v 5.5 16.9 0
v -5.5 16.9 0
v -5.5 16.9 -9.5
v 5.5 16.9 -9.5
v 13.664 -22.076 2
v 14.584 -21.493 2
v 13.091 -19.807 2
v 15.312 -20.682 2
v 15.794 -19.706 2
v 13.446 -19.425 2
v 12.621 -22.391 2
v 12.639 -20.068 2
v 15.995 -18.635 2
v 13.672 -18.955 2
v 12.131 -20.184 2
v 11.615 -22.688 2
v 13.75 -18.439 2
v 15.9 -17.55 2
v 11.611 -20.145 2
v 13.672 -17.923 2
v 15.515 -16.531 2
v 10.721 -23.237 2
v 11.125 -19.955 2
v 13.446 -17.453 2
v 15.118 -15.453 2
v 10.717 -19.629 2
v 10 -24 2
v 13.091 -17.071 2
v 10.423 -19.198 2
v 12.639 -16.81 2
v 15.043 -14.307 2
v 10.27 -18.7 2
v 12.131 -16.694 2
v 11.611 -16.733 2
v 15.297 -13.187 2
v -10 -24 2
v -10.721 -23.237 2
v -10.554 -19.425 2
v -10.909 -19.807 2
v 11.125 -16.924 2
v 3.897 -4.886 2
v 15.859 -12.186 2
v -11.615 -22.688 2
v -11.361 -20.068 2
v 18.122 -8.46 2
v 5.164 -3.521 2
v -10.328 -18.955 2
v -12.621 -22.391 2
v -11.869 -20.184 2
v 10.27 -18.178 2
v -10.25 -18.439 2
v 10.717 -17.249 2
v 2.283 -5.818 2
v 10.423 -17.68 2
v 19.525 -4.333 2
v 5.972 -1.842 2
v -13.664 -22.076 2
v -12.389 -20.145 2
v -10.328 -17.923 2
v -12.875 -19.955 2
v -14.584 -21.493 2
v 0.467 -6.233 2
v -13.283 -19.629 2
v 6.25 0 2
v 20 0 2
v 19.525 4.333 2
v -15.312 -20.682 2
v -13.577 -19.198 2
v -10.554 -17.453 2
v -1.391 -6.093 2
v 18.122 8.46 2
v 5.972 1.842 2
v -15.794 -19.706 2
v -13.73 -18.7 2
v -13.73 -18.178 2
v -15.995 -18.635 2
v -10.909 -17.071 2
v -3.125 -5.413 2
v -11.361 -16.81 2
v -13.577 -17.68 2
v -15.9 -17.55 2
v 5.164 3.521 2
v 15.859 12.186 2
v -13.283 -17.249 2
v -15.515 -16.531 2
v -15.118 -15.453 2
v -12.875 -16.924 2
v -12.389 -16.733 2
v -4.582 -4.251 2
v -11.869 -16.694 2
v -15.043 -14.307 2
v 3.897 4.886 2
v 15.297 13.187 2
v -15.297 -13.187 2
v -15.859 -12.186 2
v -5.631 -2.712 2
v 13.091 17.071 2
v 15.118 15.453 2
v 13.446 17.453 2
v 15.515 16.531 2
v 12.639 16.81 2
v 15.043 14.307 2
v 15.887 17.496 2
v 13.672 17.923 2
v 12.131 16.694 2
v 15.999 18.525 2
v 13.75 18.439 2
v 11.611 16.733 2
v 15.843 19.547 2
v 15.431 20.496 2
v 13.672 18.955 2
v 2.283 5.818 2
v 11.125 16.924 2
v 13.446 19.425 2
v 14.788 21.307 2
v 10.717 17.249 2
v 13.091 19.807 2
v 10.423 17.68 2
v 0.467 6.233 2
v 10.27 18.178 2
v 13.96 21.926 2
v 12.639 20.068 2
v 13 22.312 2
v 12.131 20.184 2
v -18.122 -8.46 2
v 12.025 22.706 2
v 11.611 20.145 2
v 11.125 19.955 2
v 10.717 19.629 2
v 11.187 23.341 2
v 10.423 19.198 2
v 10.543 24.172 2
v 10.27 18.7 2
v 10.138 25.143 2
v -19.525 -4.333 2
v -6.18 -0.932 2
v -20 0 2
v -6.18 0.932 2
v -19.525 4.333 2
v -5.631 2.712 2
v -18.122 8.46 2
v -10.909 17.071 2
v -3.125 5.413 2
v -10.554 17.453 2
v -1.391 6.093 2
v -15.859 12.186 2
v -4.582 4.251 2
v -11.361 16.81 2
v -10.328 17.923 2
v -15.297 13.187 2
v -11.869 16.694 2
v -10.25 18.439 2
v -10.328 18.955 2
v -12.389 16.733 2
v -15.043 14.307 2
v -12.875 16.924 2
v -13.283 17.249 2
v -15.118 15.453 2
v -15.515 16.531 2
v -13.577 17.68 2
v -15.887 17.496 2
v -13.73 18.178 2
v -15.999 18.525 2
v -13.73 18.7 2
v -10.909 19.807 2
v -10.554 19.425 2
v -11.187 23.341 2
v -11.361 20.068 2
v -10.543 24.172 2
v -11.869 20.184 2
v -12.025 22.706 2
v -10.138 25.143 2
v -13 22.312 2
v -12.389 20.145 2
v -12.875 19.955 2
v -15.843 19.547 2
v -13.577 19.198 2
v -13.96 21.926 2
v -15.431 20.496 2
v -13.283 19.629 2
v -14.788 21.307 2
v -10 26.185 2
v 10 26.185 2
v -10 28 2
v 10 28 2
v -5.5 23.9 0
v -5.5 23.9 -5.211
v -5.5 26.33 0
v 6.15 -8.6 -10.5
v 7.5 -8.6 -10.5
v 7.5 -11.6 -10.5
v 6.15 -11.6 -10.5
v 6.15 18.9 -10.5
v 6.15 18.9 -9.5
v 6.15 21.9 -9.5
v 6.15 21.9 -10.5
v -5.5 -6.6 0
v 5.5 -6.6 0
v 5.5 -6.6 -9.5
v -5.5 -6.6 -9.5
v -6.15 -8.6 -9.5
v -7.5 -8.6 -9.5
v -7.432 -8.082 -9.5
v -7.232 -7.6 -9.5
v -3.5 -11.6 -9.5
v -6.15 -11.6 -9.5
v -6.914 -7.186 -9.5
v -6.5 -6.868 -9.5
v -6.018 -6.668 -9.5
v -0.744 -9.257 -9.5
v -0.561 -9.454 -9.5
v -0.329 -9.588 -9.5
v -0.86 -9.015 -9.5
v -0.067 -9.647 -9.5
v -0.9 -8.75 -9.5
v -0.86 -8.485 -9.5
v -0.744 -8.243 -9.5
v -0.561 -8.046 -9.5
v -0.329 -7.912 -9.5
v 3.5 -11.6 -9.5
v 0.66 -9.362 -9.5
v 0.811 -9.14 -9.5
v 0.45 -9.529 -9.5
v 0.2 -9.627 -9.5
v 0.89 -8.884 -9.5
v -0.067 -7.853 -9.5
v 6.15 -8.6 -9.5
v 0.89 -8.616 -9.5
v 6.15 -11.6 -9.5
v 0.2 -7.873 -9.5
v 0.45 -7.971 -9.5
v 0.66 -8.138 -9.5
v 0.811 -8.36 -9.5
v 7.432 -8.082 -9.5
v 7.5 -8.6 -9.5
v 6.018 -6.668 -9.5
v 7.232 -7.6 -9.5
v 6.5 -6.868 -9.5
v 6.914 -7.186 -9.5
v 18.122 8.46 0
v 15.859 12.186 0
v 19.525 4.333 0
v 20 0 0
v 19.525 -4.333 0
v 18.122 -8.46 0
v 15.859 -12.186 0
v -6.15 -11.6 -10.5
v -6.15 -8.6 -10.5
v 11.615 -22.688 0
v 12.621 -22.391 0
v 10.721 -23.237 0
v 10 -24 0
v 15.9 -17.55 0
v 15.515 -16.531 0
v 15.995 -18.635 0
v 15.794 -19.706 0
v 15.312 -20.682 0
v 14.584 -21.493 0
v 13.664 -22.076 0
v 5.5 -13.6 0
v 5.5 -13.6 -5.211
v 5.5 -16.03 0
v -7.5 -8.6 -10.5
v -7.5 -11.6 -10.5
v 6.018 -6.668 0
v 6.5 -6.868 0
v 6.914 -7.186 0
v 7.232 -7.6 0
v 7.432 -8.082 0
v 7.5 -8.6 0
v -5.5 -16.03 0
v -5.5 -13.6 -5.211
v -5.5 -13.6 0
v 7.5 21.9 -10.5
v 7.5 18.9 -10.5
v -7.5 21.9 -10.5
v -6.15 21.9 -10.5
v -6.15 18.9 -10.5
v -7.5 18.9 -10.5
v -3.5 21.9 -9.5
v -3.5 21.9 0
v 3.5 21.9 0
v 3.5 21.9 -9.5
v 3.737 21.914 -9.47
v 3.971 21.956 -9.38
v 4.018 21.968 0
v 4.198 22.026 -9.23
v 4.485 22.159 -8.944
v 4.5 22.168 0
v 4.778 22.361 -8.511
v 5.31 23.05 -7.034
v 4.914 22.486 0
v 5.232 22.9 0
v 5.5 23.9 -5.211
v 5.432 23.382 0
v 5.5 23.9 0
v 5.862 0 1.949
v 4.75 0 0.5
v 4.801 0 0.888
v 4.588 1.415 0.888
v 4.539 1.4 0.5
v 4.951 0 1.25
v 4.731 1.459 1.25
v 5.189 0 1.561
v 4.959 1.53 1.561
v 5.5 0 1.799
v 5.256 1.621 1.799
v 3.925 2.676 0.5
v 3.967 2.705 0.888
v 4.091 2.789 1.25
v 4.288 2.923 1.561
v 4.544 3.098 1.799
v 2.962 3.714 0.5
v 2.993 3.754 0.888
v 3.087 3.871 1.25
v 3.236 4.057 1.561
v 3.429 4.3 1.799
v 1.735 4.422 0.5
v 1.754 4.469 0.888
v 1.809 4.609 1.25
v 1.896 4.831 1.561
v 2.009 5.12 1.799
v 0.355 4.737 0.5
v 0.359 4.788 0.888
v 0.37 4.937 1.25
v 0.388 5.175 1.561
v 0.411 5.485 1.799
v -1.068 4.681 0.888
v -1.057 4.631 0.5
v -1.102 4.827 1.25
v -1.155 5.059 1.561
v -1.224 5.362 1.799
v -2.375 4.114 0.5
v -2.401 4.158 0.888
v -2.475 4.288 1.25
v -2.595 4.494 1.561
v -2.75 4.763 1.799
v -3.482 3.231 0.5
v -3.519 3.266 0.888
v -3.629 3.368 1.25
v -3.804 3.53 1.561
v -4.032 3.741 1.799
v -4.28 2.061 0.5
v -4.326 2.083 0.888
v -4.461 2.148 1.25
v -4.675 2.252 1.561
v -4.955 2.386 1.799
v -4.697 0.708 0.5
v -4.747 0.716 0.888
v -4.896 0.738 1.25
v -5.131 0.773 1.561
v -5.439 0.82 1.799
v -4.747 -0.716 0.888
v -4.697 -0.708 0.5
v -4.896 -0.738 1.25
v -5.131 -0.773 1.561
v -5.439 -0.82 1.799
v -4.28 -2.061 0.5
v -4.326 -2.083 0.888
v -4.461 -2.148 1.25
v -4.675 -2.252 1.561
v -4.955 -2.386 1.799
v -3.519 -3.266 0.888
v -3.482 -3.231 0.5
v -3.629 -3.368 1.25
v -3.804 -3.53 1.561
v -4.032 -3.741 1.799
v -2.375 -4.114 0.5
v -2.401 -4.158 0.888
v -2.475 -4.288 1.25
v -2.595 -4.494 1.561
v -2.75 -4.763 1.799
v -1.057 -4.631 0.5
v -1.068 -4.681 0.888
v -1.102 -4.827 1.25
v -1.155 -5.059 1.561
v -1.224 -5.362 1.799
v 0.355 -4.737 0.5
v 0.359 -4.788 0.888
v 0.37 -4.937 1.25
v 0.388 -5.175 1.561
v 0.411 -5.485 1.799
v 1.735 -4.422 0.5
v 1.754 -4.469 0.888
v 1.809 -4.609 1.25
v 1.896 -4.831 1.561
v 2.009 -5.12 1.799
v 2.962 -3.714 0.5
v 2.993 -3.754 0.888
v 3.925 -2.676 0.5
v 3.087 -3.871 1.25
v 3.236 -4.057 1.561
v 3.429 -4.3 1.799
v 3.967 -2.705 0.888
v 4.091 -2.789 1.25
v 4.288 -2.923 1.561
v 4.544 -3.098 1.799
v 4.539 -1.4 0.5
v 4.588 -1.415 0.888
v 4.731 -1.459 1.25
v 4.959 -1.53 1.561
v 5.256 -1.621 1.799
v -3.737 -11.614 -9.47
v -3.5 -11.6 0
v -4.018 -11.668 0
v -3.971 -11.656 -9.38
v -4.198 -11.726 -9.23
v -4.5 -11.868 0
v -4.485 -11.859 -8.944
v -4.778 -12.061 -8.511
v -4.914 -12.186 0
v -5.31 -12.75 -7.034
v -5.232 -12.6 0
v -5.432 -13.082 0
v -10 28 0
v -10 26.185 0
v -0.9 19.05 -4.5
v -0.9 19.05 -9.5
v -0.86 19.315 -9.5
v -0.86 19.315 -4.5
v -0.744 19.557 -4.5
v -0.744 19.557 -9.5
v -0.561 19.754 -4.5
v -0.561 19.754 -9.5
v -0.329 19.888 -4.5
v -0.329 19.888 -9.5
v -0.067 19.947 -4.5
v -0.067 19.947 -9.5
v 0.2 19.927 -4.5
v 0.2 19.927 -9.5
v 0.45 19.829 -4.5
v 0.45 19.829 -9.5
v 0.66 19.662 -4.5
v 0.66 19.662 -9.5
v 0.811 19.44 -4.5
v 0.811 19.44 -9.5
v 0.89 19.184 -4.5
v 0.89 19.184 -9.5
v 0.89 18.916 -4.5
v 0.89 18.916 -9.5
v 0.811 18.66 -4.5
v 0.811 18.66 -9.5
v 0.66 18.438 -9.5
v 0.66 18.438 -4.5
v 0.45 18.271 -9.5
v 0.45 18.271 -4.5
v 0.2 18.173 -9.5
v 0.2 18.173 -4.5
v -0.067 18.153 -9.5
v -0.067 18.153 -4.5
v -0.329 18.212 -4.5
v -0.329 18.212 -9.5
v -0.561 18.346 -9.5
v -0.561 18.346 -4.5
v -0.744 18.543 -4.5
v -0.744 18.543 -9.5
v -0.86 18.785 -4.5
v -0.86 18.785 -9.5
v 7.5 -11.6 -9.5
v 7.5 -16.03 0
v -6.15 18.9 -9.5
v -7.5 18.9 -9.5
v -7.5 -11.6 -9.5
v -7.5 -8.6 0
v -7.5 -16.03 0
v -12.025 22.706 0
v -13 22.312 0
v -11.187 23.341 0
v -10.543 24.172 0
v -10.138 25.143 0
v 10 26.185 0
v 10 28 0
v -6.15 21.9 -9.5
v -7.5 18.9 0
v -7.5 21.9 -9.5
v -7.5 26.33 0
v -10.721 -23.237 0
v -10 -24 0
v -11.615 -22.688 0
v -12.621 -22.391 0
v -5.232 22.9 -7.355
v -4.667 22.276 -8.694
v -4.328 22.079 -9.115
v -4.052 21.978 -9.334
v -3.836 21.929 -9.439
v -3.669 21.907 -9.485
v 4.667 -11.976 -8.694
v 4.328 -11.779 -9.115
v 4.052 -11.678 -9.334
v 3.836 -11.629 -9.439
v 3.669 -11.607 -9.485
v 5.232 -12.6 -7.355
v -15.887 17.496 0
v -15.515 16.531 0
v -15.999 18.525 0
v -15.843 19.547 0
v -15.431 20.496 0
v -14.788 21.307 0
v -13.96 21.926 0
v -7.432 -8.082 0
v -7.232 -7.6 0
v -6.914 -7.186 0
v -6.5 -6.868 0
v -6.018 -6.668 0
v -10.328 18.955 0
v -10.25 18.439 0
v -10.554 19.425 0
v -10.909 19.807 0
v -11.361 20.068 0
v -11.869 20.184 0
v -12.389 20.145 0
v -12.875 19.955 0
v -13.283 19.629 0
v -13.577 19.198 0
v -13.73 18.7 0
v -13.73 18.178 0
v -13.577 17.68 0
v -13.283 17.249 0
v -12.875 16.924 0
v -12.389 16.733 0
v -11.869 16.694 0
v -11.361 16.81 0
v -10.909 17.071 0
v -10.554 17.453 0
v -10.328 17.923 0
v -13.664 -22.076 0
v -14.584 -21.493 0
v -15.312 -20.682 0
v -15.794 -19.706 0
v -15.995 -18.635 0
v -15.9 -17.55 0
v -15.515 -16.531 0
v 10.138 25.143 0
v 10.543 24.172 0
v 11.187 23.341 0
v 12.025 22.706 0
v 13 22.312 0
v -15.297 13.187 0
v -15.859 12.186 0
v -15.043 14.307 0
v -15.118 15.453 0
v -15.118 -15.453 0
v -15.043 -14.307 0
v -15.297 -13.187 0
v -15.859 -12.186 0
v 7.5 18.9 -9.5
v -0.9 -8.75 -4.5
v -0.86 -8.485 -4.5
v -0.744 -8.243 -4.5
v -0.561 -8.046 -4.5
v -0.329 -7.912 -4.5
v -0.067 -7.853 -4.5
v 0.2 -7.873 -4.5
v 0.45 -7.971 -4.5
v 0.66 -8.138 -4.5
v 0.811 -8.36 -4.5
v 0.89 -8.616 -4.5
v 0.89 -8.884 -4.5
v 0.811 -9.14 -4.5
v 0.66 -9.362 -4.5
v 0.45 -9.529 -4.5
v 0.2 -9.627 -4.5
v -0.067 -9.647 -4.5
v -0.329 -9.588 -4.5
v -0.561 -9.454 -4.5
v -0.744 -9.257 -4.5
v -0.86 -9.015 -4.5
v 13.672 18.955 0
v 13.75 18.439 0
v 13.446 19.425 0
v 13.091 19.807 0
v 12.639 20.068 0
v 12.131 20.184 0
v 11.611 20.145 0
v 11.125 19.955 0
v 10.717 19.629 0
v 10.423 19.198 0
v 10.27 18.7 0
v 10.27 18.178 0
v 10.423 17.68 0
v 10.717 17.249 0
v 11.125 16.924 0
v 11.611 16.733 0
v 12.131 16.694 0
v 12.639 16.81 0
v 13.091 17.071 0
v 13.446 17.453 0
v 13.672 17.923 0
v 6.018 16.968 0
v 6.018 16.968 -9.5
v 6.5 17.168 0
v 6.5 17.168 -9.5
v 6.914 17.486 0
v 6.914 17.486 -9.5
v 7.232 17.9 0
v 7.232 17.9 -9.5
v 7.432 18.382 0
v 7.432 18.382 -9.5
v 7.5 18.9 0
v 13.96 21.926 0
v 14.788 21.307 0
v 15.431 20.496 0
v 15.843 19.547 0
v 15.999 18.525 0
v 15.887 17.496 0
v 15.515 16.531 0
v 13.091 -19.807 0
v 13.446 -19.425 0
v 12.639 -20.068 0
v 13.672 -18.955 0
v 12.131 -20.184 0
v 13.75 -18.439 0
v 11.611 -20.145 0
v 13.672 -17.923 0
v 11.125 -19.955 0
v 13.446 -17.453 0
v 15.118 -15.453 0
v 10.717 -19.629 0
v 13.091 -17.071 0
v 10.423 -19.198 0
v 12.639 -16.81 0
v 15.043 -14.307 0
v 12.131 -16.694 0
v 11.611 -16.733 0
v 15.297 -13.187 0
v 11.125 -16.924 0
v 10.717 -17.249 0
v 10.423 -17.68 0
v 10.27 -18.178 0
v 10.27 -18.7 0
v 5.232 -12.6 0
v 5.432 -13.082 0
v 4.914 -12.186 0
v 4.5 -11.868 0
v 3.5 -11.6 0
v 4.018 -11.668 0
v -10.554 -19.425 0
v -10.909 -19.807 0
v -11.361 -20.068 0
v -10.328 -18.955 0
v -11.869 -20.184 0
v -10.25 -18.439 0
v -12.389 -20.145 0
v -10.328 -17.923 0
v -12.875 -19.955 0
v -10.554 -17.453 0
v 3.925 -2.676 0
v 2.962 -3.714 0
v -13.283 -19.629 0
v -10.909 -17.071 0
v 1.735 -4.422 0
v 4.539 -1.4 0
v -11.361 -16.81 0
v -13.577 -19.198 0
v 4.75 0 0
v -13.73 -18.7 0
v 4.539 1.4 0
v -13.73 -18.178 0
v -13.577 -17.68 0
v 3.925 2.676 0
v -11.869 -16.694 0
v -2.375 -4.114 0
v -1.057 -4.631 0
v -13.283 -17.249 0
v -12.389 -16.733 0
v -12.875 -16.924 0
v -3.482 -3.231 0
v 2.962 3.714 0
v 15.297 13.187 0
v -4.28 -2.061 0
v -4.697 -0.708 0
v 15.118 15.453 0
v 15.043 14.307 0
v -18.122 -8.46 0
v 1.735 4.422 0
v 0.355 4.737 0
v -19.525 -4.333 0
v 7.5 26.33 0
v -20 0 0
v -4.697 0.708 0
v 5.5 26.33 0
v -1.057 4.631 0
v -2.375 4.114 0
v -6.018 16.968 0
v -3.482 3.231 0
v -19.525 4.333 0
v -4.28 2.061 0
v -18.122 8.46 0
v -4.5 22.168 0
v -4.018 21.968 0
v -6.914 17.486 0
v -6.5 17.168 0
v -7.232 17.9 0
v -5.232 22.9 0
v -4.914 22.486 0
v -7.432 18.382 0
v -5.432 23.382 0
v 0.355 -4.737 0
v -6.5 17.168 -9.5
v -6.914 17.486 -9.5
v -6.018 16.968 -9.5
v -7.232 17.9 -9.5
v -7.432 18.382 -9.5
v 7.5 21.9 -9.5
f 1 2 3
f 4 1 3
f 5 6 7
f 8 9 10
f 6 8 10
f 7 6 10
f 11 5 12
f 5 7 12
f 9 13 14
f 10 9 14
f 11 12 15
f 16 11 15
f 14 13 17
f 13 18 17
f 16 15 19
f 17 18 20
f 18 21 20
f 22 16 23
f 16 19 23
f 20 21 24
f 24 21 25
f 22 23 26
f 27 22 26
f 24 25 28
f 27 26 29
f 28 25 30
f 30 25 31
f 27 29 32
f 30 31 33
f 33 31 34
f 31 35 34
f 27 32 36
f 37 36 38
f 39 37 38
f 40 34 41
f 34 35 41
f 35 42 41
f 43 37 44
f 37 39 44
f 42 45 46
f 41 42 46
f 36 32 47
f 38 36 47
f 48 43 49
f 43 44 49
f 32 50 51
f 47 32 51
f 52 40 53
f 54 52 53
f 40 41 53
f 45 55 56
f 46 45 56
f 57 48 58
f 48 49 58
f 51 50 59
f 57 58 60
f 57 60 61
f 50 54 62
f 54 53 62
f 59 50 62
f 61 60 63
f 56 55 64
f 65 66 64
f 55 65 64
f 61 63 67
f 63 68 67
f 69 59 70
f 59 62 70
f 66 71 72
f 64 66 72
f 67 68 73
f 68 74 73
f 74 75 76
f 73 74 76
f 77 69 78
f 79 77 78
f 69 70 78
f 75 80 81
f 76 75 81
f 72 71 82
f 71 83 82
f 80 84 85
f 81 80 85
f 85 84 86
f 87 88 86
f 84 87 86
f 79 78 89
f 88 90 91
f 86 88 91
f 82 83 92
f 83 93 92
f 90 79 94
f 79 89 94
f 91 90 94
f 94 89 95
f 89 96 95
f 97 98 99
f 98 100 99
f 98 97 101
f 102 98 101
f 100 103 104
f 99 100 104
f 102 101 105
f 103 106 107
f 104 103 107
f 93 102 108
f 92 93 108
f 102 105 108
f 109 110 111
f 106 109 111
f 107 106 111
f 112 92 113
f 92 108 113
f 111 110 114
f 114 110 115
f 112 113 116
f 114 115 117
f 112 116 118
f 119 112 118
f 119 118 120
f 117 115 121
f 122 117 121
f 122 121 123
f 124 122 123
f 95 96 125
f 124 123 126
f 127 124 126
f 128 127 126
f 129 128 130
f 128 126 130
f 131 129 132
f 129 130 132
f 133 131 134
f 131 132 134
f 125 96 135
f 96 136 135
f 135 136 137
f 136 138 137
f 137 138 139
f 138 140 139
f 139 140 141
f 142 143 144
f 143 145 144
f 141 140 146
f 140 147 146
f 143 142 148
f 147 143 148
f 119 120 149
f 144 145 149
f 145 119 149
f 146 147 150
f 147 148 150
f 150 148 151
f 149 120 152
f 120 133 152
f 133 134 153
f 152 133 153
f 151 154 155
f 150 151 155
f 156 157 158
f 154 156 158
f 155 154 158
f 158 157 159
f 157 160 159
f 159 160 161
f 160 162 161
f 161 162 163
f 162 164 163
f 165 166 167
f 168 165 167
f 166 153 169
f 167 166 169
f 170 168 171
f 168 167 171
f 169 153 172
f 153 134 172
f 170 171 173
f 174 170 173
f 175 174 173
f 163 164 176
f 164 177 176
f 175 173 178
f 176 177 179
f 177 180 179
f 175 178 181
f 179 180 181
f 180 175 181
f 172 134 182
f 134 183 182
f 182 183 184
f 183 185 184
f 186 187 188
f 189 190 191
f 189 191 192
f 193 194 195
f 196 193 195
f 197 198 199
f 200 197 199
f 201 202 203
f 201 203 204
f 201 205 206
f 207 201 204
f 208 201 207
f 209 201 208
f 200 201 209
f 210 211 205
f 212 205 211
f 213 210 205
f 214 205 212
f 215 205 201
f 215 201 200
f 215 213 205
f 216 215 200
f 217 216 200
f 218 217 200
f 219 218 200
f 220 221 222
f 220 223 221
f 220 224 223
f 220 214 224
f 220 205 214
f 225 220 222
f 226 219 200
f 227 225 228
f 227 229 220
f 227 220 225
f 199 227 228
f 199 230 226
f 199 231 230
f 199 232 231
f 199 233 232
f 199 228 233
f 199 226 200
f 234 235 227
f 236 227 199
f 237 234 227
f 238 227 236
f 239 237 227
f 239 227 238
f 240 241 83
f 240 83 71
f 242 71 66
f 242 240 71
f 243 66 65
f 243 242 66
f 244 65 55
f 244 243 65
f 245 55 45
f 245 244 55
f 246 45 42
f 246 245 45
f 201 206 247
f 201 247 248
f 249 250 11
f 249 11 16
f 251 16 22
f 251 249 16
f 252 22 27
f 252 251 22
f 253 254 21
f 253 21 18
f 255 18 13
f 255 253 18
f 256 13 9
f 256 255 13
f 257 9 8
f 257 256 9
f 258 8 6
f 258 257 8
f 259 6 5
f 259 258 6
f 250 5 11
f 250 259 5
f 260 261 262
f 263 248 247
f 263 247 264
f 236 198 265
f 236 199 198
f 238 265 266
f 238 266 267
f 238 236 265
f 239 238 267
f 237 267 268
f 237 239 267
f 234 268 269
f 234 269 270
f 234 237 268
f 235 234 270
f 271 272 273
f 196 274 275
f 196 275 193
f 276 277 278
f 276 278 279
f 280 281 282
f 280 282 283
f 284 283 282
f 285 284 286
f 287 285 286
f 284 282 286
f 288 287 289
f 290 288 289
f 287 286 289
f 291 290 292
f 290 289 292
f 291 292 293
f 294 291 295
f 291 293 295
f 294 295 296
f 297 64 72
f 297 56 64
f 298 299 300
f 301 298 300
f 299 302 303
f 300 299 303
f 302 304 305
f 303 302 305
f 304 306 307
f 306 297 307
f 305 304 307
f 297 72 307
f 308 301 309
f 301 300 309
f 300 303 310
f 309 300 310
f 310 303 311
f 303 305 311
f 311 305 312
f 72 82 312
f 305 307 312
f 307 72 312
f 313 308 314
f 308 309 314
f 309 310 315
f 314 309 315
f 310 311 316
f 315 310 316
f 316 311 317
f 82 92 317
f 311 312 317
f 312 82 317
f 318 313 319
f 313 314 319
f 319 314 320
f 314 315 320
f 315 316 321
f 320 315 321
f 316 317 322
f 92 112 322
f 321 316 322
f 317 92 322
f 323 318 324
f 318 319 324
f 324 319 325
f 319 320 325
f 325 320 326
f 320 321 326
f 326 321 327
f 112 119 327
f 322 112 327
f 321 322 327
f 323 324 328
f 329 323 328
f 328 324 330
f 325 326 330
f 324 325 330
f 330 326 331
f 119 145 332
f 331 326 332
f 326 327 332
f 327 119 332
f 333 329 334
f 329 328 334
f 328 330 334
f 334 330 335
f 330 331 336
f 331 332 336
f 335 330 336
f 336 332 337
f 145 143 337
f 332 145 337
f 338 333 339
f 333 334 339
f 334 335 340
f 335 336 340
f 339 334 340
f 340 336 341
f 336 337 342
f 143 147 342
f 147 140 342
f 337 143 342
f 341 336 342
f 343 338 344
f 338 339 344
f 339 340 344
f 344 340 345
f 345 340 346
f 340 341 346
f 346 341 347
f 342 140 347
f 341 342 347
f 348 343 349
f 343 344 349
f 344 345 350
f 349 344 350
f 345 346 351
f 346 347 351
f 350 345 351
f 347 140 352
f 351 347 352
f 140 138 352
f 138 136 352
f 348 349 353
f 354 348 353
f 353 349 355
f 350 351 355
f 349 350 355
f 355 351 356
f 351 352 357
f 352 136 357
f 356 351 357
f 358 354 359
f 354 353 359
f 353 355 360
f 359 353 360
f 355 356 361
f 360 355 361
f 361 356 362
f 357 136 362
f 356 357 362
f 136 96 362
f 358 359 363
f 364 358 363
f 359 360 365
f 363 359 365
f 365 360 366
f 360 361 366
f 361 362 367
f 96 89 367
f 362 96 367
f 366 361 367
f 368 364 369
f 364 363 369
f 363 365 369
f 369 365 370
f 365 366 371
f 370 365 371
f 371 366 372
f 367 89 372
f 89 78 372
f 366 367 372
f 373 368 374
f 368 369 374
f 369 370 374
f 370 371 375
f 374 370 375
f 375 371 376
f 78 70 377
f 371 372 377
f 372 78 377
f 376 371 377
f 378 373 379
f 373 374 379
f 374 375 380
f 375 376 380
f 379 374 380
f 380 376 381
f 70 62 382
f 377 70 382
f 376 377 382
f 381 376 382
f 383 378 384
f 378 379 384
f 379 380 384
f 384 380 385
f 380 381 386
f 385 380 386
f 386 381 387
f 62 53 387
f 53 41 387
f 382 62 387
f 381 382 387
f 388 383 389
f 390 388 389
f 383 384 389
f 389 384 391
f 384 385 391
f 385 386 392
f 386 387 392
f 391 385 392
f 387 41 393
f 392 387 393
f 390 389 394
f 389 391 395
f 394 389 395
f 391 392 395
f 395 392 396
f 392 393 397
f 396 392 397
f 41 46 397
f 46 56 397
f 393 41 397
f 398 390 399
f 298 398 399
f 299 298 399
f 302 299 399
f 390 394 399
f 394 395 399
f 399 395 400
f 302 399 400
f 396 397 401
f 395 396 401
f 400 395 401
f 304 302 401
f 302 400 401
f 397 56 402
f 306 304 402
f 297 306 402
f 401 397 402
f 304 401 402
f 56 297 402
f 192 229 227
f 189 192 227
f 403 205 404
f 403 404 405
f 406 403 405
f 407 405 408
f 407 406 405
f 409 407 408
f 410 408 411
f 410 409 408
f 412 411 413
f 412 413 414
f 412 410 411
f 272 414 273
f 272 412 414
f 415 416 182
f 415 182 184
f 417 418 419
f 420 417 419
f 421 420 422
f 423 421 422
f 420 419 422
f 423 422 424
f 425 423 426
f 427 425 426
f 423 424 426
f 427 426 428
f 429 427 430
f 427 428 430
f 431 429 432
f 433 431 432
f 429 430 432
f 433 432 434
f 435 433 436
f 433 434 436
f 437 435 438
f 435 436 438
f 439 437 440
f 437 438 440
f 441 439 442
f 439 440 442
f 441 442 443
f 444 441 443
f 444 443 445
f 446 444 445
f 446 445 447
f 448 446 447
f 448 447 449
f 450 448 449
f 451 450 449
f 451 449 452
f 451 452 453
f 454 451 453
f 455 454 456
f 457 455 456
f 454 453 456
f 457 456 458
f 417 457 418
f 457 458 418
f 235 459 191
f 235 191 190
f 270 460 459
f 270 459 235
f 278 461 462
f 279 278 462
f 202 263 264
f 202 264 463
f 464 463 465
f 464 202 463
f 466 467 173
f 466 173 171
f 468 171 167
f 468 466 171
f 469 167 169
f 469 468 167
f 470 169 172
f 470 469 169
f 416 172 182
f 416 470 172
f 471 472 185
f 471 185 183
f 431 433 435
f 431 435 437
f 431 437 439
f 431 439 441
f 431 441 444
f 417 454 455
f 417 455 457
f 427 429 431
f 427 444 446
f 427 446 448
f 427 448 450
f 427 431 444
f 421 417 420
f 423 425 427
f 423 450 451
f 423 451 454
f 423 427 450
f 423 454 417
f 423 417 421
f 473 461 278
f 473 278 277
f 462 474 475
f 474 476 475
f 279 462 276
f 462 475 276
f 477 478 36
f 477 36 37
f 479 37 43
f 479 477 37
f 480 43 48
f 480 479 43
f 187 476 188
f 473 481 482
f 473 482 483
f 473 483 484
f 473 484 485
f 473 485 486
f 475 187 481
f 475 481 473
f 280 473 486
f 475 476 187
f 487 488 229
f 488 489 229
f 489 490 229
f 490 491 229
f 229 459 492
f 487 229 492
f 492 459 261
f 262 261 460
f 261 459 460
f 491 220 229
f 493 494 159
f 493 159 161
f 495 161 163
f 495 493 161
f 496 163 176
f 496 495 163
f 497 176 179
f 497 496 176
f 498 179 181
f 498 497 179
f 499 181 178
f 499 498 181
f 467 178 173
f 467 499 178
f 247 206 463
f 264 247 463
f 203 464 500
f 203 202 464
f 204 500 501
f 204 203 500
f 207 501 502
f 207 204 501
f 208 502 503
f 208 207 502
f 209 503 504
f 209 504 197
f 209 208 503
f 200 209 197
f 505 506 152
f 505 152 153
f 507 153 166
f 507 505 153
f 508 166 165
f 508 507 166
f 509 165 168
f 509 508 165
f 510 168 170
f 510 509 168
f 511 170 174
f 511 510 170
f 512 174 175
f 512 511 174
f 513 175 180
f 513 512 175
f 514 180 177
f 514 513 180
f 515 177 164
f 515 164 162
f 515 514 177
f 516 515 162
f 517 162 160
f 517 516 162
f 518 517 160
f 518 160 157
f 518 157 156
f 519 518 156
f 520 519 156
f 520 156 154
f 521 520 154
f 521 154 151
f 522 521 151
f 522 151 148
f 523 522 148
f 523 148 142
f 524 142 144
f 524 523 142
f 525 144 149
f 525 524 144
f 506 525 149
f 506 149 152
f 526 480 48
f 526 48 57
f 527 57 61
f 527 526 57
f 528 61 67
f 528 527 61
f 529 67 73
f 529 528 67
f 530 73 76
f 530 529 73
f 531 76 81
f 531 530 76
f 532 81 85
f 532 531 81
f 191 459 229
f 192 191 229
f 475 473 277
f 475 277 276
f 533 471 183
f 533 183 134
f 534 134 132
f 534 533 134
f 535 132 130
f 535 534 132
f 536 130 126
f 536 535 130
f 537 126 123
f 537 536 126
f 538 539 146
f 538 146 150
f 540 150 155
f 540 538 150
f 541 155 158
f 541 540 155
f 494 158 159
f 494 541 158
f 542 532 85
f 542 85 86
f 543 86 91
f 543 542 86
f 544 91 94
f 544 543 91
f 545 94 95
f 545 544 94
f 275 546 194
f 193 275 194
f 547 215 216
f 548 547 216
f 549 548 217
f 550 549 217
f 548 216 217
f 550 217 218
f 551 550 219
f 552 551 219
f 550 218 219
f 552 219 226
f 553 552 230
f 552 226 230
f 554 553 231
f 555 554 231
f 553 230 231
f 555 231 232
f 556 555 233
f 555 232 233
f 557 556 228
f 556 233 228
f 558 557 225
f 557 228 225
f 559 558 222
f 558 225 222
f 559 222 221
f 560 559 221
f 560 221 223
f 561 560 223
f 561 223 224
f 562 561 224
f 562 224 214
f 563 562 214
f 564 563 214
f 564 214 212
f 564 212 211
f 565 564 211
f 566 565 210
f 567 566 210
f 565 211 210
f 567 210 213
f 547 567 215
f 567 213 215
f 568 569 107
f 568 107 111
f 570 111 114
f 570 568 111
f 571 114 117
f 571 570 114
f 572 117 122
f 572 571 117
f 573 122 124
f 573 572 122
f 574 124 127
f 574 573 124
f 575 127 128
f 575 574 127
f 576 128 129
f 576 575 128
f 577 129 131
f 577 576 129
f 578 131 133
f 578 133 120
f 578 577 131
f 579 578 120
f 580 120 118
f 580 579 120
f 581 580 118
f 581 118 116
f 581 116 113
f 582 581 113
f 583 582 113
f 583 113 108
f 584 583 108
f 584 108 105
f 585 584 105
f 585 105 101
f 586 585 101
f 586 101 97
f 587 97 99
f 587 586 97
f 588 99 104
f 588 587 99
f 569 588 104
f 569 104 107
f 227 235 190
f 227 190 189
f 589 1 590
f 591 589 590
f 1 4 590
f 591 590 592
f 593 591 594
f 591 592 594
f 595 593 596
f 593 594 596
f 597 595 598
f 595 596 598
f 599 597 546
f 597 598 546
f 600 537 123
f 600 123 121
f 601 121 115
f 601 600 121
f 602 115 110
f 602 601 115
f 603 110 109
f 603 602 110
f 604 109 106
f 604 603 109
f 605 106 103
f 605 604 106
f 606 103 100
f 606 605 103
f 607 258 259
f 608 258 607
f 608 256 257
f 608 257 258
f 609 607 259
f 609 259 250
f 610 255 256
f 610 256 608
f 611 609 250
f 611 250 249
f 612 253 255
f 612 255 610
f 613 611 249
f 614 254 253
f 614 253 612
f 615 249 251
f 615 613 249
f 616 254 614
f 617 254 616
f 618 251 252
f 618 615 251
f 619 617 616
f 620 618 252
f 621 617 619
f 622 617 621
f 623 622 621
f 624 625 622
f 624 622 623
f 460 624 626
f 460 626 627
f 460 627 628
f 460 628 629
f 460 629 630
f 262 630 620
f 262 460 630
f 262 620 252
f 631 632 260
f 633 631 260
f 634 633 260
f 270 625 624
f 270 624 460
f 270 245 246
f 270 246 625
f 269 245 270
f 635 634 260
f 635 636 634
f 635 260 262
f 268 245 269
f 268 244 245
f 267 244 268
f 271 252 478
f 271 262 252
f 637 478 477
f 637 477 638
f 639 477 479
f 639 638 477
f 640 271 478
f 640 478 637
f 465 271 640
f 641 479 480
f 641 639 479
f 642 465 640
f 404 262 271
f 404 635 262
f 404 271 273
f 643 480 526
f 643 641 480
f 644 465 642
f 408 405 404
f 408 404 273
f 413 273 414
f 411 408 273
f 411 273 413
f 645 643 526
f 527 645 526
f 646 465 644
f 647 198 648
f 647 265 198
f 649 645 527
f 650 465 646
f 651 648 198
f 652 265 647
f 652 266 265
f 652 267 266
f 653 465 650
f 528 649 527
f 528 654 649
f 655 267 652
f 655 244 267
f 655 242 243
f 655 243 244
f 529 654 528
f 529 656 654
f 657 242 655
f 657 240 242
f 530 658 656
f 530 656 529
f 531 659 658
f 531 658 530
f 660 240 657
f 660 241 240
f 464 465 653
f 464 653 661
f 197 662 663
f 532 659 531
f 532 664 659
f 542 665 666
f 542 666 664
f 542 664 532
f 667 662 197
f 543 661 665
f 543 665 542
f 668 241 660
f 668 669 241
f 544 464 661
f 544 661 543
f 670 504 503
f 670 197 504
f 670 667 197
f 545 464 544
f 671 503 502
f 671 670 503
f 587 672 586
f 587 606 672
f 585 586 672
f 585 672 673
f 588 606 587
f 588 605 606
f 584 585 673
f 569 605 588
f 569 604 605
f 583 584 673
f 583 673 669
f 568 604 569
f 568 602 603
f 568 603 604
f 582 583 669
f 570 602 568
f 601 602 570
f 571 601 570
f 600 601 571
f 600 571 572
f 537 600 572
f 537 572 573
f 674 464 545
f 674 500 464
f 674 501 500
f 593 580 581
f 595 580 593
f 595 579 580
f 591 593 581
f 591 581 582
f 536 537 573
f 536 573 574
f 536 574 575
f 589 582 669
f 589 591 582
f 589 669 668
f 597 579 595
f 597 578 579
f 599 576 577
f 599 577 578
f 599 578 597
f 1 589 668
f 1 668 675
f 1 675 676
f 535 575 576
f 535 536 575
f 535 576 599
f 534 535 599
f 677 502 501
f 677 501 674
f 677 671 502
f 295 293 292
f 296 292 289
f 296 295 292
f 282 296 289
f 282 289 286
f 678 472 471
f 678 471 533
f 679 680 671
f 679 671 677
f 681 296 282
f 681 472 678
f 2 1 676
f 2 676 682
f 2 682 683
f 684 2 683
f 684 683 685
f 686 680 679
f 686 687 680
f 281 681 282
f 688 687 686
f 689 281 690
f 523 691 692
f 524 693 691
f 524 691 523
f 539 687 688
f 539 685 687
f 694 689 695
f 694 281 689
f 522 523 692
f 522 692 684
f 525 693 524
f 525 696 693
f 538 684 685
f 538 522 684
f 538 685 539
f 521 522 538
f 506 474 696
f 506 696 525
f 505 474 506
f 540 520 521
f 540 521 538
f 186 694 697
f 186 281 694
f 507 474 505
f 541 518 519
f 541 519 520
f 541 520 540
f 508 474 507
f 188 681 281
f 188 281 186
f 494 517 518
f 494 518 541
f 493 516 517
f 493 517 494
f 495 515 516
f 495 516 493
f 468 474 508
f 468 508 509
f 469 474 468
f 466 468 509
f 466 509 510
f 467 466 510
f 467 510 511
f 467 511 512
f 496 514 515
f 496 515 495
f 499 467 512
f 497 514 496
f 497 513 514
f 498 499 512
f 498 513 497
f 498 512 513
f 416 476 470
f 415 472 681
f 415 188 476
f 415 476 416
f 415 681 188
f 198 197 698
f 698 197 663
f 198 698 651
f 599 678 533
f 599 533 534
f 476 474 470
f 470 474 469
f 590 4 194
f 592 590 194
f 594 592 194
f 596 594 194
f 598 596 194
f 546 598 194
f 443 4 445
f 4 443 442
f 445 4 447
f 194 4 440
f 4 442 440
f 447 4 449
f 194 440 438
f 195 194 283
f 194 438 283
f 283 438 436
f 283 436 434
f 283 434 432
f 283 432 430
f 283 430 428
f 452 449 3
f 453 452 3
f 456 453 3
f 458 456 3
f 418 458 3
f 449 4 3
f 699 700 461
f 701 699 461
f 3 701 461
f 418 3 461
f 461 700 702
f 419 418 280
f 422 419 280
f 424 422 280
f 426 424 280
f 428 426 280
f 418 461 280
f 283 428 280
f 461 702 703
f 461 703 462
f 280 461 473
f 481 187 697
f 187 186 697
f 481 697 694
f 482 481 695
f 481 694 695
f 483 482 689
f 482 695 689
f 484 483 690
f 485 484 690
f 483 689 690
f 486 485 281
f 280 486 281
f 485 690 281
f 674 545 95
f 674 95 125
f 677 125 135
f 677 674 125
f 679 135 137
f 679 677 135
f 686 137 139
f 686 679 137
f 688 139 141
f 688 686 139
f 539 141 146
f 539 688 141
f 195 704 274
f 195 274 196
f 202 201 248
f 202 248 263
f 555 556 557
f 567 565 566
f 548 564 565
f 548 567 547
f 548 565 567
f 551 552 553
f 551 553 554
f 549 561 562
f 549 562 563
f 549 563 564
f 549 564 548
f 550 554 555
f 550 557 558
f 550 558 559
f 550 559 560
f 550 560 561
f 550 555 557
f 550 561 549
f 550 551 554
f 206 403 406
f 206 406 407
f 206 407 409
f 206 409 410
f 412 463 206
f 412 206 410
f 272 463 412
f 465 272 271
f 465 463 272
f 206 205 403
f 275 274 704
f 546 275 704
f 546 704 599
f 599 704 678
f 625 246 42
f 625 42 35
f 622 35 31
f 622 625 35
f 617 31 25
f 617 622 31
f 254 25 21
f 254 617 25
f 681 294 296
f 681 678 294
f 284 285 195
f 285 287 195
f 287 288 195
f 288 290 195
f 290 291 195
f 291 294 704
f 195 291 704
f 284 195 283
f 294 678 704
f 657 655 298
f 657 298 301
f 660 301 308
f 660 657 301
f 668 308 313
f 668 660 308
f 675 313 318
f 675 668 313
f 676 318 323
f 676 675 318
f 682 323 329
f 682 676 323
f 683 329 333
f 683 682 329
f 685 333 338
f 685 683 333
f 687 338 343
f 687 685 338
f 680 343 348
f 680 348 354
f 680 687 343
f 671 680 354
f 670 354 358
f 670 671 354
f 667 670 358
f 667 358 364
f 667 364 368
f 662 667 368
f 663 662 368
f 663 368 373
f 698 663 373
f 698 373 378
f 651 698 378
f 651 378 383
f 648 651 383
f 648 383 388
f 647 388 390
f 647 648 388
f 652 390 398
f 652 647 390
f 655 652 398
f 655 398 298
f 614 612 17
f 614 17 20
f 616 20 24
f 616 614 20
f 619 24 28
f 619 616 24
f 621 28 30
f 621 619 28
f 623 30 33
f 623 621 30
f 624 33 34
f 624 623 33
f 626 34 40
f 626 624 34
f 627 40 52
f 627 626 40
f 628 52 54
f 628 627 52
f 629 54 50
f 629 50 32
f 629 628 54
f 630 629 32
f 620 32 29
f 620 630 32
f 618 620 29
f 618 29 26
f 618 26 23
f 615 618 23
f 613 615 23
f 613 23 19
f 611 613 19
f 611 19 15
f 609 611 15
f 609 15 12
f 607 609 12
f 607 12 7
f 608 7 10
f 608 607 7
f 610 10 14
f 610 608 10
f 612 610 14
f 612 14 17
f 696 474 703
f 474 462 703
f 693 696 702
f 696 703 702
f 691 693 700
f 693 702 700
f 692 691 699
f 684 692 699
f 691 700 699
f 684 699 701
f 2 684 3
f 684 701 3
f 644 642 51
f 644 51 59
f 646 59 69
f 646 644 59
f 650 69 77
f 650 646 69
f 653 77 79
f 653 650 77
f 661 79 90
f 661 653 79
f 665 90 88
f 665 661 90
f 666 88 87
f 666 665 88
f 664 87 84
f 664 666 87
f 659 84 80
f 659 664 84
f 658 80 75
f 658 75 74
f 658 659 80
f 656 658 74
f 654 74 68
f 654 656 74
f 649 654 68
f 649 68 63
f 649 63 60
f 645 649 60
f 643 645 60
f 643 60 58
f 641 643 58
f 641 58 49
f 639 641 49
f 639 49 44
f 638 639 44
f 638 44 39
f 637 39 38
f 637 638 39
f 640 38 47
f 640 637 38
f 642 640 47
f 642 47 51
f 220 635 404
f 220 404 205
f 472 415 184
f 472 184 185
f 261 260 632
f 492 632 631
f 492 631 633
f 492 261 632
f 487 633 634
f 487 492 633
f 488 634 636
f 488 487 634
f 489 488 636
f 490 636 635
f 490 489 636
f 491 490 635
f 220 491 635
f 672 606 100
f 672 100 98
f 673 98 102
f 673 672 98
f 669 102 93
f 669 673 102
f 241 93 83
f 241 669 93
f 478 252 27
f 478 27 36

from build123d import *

# Parameters (mm, degrees)
CROQUIS1_R              = 1.75
CROQUIS1_R_2            = 4.75
SALIENTE_EXTRUIR1_DEPTH = 2
REDONDEO1_R             = 1.5
CROQUIS2_W              = 9.5
CROQUIS2_H              = 5
SALIENTE_EXTRUIR2_DEPTH = 7.5
CROQUIS3_R              = 0.9
CORTAR_EXTRUIR1_DEPTH   = 5
SALIENTE_EXTRUIR3_DEPTH = 2
REDONDEO2_R             = 2
REDONDEO3_R             = 2
CROQUIS5_W              = 1.35
CROQUIS5_H              = 3
SALIENTE_EXTRUIR4_DEPTH = 1


with BuildPart() as part:
    # Croquis1 → Saliente-Extruir1 (new body)
    with BuildSketch(Plane.XY):
        with BuildLine():
            Line((10, -24), (8, -24))
            Line((8, -24), (-8, -24))
            Line((-8, -24), (-10, -24))
            ThreePointArc((-10, -24), (-11.149780948, -22.933215846), (-12.621352058, -22.390534425))
            ThreePointArc((-12.621352058, -22.390534425), (-15.586404832, -20.210444436), (-15.515491876, -16.530865429))
            ThreePointArc((-15.515491876, -16.530865429), (-15.043435032, -14.307276752), (-15.859153127, -12.185534953))
            ThreePointArc((-15.859153127, -12.185534953), (-20, 0), (-15.859153127, 12.185534953))
            ThreePointArc((-15.859153127, 12.185534953), (-15.043435032, 14.307276752), (-15.515491876, 16.530865429))
            ThreePointArc((-15.515491876, 16.530865429), (-15.667833806, 20.035019732), (-13, 22.312072261))
            ThreePointArc((-13, 22.312072261), (-10.83772234, 23.735565864), (-10, 26.185055607))
            Line((-10, 26.185055607), (-10, 28))
            Line((-10, 28), (10, 28))
            Line((10, 28), (10, 26.185055607))
            ThreePointArc((10, 26.185055607), (10.83772234, 23.735565864), (13, 22.312072261))
            ThreePointArc((13, 22.312072261), (15.667833806, 20.035019732), (15.515491876, 16.530865429))
            ThreePointArc((15.515491876, 16.530865429), (15.043435032, 14.307276752), (15.859153127, 12.185534953))
            ThreePointArc((15.859153127, 12.185534953), (20, 0), (15.859153127, -12.185534953))
            ThreePointArc((15.859153127, -12.185534953), (15.043435032, -14.307276752), (15.515491876, -16.530865429))
            ThreePointArc((15.515491876, -16.530865429), (15.586404832, -20.210444436), (12.621352058, -22.390534425))
            ThreePointArc((12.621352058, -22.390534425), (11.149780948, -22.933215846), (10, -24))
        make_face()
        with Locations((-12, -18.439088915)):
            Circle(CROQUIS1_R, mode=Mode.SUBTRACT)
        with Locations((12, -18.439088915)):
            Circle(CROQUIS1_R, mode=Mode.SUBTRACT)
        with Locations((12, 18.439088915)):
            Circle(CROQUIS1_R, mode=Mode.SUBTRACT)
        with Locations((-12, 18.439088915)):
            Circle(CROQUIS1_R, mode=Mode.SUBTRACT)
        Circle(CROQUIS1_R_2, mode=Mode.SUBTRACT)
    extrude(amount=SALIENTE_EXTRUIR1_DEPTH)

    # Redondeo1
    redondeo1_edges = [part.edges().sort_by_distance(p)[0] for p in [
        (-4.75, 0, 2),
    ]]
    fillet(redondeo1_edges, radius=REDONDEO1_R)

    # Croquis2 → Saliente-Extruir2 (add, symmetric)
    with BuildSketch(Plane(origin=(0, 0, 0), x_dir=(0, 0, -1), z_dir=(1, 0, 0))):
        with Locations((4.75, 19.4)):
            Rectangle(CROQUIS2_W, CROQUIS2_H)
        with Locations((4.75, -9.1)):
            Rectangle(CROQUIS2_W, CROQUIS2_H)
    extrude(amount=SALIENTE_EXTRUIR2_DEPTH, both=True)

    # Croquis3 → Cortar-Extruir1 (cut)
    with BuildSketch(Plane(origin=(0, 0, -9.5), x_dir=(-1, 0, 0), z_dir=(0, 0, -1))):
        with Locations((0, -8.75)):
            Circle(CROQUIS3_R)
        with Locations((0, 19.05)):
            Circle(CROQUIS3_R)
    extrude(amount=-CORTAR_EXTRUIR1_DEPTH, mode=Mode.SUBTRACT)

    # Croquis4 → Saliente-Extruir3 (add)
    with BuildSketch(Plane.ZY.offset(7.5)):
        Polygon((-9.5, -11.6), (0, -16.029922752), (0, -11.6), align=None)
        Polygon((-9.5, 21.9), (0, 21.9), (0, 26.329922752), align=None)
    saliente_extruir3 = extrude(amount=-SALIENTE_EXTRUIR3_DEPTH)

    # Simetría1: Saliente-Extruir3 across plane
    add(saliente_extruir3.mirror(Plane(origin=(0, 0, 0), x_dir=(0, 0, 1), z_dir=(1, 0, 0))))

    # Redondeo2
    redondeo2_edges = [part.edges().sort_by_distance(p)[0] for p in [
        (-5.5, -11.6, -4.75),
        (-5.5, 21.9, -4.75),
        (5.5, -11.6, -4.75),
        (5.5, 21.9, -4.75),
    ]]
    fillet(redondeo2_edges, radius=REDONDEO2_R)

    # Redondeo3
    redondeo3_edges = [part.edges().sort_by_distance(p)[0] for p in [
        (-7.5, 16.9, -4.75),
        (7.5, 16.9, -4.75),
        (-7.5, -6.6, -4.75),
        (7.5, -6.6, -4.75),
    ]]
    fillet(redondeo3_edges, radius=REDONDEO3_R)

    # Croquis5 → Saliente-Extruir4 (add)
    with BuildSketch(Plane(origin=(0, 0, -9.5), x_dir=(-1, 0, 0), z_dir=(0, 0, -1))):
        with Locations((-6.825, -10.1)):
            Rectangle(CROQUIS5_W, CROQUIS5_H)
        with Locations((6.825, -10.1)):
            Rectangle(CROQUIS5_W, CROQUIS5_H)
        with Locations((6.825, 20.4)):
            Rectangle(CROQUIS5_W, CROQUIS5_H)
        with Locations((-6.825, 20.4)):
            Rectangle(CROQUIS5_W, CROQUIS5_H)
    extrude(amount=SALIENTE_EXTRUIR4_DEPTH)


solid = part.part
